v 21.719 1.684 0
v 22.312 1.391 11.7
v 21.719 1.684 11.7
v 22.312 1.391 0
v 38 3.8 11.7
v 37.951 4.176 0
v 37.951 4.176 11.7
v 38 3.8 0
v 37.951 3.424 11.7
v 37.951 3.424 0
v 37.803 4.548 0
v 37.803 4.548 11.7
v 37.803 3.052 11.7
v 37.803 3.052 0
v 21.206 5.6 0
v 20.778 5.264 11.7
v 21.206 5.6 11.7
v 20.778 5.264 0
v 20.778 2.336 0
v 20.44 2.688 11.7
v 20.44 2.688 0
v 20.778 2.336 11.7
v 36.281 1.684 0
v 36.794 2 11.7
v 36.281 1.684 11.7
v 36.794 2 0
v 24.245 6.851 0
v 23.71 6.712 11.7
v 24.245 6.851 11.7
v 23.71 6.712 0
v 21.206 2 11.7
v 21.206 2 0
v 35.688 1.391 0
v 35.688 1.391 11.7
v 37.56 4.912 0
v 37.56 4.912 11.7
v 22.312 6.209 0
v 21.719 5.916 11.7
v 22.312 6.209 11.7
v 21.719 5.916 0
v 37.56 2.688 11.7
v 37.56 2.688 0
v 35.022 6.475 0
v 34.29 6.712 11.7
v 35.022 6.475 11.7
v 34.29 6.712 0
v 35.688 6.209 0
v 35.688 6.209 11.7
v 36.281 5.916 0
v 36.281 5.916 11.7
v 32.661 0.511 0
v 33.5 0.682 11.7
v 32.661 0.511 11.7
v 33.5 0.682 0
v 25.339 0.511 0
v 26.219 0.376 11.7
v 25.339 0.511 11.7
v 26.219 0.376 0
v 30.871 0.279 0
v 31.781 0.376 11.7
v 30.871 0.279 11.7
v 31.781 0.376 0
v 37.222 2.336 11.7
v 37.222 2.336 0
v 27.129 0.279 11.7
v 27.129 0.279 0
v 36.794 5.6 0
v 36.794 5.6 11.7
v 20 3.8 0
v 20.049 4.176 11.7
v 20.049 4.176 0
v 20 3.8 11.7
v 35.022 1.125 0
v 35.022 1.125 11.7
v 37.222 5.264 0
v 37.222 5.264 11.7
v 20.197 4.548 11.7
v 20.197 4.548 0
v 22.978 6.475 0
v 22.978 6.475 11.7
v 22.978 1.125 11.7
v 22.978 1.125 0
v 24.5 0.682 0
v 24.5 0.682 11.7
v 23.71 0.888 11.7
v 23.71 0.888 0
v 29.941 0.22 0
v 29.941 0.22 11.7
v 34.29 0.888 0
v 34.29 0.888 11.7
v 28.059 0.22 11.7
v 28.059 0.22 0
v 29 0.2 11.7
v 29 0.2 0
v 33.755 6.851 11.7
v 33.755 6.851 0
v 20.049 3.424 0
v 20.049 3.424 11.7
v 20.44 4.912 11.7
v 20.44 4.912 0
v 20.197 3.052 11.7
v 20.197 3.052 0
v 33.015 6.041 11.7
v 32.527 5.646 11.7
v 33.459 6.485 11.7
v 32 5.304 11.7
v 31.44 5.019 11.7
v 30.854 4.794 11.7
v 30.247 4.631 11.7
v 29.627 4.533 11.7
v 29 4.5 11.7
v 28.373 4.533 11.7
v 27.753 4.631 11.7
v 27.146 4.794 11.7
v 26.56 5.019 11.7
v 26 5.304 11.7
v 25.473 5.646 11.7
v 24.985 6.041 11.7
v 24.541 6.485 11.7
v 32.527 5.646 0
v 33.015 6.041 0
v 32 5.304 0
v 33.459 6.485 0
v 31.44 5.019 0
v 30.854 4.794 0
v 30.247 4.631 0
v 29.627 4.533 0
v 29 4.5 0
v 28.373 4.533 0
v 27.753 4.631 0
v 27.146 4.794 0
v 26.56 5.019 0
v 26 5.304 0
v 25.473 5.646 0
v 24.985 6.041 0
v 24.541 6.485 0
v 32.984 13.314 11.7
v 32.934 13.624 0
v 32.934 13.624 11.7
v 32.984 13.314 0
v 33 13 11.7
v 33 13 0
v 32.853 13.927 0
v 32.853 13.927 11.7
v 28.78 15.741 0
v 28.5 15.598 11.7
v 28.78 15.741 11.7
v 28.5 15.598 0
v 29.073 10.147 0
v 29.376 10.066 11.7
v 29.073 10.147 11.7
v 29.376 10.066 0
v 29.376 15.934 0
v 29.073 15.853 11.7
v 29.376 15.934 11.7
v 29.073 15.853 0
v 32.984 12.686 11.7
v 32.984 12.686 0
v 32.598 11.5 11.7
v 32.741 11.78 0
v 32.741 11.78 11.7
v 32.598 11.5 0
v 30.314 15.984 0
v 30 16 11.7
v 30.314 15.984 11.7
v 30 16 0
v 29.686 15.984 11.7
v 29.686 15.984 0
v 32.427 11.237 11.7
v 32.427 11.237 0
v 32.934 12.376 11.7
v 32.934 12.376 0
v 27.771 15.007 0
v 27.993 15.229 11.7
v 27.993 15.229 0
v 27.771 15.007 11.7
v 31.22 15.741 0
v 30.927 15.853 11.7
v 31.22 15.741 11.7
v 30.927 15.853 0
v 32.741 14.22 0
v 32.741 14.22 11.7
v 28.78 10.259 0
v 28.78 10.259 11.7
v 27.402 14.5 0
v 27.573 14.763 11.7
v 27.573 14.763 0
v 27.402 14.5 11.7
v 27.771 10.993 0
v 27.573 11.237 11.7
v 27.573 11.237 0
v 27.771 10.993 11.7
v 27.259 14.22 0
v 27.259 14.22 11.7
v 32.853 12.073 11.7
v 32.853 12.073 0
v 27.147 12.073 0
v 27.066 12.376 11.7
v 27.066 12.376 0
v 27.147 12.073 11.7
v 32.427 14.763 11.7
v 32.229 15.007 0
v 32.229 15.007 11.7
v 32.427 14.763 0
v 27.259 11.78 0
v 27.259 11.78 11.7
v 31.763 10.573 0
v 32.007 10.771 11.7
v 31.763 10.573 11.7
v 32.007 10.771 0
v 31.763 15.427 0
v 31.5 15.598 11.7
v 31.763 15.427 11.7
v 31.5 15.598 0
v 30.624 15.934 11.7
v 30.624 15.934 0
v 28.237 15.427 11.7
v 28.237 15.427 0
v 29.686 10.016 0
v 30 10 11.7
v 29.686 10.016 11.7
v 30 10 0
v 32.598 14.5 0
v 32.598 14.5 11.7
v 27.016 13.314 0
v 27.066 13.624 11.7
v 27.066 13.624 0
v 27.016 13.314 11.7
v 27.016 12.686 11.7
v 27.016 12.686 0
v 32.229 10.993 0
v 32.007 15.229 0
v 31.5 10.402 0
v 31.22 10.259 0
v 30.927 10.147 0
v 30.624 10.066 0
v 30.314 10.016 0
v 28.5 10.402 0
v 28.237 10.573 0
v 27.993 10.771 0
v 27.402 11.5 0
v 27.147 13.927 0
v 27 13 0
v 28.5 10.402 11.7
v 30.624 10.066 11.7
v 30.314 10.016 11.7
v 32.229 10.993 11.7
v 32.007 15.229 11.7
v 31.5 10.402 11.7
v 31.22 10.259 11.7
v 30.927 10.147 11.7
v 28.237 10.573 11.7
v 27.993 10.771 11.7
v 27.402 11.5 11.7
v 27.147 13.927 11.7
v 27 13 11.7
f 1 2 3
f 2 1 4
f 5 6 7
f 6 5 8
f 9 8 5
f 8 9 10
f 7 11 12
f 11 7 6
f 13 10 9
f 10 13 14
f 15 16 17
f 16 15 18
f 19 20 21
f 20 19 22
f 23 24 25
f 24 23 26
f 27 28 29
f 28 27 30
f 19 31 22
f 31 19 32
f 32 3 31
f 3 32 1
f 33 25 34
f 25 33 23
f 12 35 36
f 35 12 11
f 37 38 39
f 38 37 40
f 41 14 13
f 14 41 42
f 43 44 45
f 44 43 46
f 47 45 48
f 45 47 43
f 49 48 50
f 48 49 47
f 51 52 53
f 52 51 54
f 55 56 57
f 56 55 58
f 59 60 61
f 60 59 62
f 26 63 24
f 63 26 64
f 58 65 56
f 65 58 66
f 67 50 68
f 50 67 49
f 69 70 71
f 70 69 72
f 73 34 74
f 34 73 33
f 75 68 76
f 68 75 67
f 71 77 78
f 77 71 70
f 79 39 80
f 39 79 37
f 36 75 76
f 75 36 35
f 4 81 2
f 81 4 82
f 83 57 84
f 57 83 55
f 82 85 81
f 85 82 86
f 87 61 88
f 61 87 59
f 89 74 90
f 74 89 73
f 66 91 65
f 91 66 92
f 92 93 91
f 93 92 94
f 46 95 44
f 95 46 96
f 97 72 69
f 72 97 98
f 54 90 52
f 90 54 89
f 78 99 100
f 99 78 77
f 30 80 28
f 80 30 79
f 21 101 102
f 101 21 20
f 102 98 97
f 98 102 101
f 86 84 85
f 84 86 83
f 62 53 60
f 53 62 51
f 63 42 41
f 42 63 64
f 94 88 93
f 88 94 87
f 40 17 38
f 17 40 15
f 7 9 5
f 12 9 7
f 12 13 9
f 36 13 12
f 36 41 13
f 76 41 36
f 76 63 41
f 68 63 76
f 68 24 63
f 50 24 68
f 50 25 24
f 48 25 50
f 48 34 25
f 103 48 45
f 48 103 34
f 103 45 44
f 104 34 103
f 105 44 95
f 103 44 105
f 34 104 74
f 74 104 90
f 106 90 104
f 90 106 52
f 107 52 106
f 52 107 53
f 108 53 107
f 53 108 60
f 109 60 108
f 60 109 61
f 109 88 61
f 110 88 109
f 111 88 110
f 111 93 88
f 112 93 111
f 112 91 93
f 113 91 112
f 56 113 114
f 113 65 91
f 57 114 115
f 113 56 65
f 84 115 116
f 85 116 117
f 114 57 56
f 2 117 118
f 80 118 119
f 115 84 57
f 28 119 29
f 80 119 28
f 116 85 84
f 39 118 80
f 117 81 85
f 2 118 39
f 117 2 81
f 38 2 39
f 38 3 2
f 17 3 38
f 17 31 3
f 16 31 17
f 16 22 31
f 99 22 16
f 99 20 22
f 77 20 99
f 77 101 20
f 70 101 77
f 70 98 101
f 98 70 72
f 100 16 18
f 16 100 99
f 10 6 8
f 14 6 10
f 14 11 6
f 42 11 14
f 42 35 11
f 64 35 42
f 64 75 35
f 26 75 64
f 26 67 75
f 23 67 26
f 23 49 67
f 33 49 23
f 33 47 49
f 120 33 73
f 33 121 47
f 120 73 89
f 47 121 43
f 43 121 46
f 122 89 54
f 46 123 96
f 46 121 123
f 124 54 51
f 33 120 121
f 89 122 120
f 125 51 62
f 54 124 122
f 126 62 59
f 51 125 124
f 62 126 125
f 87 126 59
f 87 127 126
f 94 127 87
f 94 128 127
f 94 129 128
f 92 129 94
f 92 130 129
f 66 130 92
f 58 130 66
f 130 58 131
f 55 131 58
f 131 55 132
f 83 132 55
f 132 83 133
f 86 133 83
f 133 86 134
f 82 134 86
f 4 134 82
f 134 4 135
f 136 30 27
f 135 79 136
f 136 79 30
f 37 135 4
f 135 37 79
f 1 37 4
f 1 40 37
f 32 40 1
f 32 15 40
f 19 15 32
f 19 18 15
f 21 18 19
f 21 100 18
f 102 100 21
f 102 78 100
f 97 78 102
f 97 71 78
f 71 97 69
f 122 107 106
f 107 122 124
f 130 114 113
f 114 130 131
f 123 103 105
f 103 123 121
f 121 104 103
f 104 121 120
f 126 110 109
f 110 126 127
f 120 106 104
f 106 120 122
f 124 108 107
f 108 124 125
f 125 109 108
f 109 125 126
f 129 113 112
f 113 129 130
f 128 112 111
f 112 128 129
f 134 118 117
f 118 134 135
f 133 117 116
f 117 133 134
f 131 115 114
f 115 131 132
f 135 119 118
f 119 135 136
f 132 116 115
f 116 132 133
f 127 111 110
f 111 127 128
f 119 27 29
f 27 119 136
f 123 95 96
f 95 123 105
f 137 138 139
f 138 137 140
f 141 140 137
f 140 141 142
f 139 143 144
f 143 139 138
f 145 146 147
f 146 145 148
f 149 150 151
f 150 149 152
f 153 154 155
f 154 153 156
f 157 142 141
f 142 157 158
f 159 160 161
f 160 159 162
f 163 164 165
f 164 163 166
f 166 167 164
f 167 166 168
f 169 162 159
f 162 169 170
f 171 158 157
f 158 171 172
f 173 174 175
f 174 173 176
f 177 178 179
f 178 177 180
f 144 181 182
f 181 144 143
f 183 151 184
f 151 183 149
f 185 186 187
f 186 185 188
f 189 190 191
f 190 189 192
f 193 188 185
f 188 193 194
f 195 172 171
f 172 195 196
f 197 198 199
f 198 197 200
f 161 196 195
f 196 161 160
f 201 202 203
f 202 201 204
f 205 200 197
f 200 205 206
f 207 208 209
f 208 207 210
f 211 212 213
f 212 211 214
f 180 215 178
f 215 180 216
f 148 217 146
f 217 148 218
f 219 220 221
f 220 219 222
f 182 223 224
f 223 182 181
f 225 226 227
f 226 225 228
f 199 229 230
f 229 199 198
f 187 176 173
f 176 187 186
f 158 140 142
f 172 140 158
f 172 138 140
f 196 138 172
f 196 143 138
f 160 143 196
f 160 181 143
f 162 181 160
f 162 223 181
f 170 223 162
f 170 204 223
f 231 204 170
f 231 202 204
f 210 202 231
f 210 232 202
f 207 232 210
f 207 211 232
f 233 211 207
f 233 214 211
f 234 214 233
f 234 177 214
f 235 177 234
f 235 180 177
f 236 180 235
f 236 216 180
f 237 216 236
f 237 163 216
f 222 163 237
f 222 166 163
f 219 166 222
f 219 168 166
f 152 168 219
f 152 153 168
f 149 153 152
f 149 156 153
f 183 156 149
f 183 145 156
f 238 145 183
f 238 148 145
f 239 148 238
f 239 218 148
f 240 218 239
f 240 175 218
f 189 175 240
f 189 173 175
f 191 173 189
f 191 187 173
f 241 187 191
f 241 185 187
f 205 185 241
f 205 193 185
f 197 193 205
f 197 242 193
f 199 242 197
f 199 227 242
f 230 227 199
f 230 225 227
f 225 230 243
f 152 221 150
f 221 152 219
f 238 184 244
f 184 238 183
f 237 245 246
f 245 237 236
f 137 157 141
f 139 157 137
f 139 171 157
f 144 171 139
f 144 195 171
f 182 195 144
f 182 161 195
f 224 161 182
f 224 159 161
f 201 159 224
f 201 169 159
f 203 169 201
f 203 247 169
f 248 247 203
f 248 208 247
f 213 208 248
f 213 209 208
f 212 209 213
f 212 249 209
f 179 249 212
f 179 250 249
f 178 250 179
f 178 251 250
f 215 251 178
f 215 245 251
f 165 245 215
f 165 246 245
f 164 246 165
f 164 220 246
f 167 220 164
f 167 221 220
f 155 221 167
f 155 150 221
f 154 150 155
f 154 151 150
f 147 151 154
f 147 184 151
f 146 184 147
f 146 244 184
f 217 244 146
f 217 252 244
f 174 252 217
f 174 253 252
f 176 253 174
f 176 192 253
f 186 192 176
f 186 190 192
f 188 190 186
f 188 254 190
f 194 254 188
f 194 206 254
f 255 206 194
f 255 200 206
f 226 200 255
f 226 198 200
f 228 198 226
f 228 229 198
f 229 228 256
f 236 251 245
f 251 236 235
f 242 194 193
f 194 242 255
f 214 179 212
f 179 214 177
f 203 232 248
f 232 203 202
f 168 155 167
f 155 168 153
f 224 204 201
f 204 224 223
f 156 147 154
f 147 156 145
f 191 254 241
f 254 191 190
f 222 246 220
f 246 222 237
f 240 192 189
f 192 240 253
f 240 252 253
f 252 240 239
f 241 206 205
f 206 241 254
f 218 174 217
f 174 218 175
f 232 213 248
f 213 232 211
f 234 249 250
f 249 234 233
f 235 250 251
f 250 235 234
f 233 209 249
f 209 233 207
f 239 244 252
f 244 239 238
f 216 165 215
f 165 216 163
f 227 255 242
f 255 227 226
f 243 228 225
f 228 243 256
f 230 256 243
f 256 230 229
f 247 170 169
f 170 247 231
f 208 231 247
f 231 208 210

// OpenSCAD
//LABELS FOR CUSTOMIZER

// Adjust parameters here:
Closing_Gap = "smooth"; //[full,smooth]
//Closing_Gap = "full"; //[full,smooth]

squeeze_diameter = 3; //[2:4]
squeeze_position = 29; //[25:32]

/*[Material]*/
tube_diameter = 6.5;

/*[Hidden]*/
clamp_height = tube_diameter * 1.8;
 
difference(){

 color("deeppink") translate([-0, -0, 0]) 
 linear_extrude(center = false, height = clamp_height, convexity = 10) import (file = "tube_clamp_frame.dxf");    
    
    translate([-2,8,clamp_height/2]) rotate([0,90,0]) cylinder(h=10,r=tube_diameter/2, $fn = 60);  
    translate([35,8,clamp_height/2]) rotate([0,90,0]) cylinder(h=10,r=tube_diameter/2, $fn = 60);  
    
    }
 
if(Closing_Gap=="full")
{
  color("pink") translate([squeeze_position+1,13,0]) rotate([0,0,0]) 
    cylinder(h=clamp_height,r=squeeze_diameter, $fn = 60); 
  color("pink") translate([squeeze_position,3,0]) rotate([0,0,0]) 
    cylinder(h=clamp_height,r=squeeze_diameter, $fn = 60); 
}  
 
if(Closing_Gap=="smooth")
{
  difference(){
  color("pink") translate([squeeze_position,3.8,0]) rotate([0,0,0]) scale([2,0.8,1])
    cylinder(h=clamp_height,r=squeeze_diameter*1.5, $fn = 60);    
      
  color("pink") translate([squeeze_position,10.5,-1]) rotate([0,0,0]) 
    cylinder(h=clamp_height+2,r=squeeze_diameter*2, $fn = 60);      
  }
   
  color("pink") translate([squeeze_position+1,13,0]) rotate([0,0,0]) 
    cylinder(h=clamp_height,r=squeeze_diameter, $fn = 60);  
}  

  /*
  color("pink") translate([squeeze_position-2,3,0]) rotate([0,0,0]) 
    cylinder(h=clamp_height,r=squeeze_diameter, $fn = 60);  
  color("pink") translate([squeeze_position+2,3,0]) rotate([0,0,0]) 
    cylinder(h=clamp_height,r=squeeze_diameter, $fn = 60);  
    */
  

    
 

    
